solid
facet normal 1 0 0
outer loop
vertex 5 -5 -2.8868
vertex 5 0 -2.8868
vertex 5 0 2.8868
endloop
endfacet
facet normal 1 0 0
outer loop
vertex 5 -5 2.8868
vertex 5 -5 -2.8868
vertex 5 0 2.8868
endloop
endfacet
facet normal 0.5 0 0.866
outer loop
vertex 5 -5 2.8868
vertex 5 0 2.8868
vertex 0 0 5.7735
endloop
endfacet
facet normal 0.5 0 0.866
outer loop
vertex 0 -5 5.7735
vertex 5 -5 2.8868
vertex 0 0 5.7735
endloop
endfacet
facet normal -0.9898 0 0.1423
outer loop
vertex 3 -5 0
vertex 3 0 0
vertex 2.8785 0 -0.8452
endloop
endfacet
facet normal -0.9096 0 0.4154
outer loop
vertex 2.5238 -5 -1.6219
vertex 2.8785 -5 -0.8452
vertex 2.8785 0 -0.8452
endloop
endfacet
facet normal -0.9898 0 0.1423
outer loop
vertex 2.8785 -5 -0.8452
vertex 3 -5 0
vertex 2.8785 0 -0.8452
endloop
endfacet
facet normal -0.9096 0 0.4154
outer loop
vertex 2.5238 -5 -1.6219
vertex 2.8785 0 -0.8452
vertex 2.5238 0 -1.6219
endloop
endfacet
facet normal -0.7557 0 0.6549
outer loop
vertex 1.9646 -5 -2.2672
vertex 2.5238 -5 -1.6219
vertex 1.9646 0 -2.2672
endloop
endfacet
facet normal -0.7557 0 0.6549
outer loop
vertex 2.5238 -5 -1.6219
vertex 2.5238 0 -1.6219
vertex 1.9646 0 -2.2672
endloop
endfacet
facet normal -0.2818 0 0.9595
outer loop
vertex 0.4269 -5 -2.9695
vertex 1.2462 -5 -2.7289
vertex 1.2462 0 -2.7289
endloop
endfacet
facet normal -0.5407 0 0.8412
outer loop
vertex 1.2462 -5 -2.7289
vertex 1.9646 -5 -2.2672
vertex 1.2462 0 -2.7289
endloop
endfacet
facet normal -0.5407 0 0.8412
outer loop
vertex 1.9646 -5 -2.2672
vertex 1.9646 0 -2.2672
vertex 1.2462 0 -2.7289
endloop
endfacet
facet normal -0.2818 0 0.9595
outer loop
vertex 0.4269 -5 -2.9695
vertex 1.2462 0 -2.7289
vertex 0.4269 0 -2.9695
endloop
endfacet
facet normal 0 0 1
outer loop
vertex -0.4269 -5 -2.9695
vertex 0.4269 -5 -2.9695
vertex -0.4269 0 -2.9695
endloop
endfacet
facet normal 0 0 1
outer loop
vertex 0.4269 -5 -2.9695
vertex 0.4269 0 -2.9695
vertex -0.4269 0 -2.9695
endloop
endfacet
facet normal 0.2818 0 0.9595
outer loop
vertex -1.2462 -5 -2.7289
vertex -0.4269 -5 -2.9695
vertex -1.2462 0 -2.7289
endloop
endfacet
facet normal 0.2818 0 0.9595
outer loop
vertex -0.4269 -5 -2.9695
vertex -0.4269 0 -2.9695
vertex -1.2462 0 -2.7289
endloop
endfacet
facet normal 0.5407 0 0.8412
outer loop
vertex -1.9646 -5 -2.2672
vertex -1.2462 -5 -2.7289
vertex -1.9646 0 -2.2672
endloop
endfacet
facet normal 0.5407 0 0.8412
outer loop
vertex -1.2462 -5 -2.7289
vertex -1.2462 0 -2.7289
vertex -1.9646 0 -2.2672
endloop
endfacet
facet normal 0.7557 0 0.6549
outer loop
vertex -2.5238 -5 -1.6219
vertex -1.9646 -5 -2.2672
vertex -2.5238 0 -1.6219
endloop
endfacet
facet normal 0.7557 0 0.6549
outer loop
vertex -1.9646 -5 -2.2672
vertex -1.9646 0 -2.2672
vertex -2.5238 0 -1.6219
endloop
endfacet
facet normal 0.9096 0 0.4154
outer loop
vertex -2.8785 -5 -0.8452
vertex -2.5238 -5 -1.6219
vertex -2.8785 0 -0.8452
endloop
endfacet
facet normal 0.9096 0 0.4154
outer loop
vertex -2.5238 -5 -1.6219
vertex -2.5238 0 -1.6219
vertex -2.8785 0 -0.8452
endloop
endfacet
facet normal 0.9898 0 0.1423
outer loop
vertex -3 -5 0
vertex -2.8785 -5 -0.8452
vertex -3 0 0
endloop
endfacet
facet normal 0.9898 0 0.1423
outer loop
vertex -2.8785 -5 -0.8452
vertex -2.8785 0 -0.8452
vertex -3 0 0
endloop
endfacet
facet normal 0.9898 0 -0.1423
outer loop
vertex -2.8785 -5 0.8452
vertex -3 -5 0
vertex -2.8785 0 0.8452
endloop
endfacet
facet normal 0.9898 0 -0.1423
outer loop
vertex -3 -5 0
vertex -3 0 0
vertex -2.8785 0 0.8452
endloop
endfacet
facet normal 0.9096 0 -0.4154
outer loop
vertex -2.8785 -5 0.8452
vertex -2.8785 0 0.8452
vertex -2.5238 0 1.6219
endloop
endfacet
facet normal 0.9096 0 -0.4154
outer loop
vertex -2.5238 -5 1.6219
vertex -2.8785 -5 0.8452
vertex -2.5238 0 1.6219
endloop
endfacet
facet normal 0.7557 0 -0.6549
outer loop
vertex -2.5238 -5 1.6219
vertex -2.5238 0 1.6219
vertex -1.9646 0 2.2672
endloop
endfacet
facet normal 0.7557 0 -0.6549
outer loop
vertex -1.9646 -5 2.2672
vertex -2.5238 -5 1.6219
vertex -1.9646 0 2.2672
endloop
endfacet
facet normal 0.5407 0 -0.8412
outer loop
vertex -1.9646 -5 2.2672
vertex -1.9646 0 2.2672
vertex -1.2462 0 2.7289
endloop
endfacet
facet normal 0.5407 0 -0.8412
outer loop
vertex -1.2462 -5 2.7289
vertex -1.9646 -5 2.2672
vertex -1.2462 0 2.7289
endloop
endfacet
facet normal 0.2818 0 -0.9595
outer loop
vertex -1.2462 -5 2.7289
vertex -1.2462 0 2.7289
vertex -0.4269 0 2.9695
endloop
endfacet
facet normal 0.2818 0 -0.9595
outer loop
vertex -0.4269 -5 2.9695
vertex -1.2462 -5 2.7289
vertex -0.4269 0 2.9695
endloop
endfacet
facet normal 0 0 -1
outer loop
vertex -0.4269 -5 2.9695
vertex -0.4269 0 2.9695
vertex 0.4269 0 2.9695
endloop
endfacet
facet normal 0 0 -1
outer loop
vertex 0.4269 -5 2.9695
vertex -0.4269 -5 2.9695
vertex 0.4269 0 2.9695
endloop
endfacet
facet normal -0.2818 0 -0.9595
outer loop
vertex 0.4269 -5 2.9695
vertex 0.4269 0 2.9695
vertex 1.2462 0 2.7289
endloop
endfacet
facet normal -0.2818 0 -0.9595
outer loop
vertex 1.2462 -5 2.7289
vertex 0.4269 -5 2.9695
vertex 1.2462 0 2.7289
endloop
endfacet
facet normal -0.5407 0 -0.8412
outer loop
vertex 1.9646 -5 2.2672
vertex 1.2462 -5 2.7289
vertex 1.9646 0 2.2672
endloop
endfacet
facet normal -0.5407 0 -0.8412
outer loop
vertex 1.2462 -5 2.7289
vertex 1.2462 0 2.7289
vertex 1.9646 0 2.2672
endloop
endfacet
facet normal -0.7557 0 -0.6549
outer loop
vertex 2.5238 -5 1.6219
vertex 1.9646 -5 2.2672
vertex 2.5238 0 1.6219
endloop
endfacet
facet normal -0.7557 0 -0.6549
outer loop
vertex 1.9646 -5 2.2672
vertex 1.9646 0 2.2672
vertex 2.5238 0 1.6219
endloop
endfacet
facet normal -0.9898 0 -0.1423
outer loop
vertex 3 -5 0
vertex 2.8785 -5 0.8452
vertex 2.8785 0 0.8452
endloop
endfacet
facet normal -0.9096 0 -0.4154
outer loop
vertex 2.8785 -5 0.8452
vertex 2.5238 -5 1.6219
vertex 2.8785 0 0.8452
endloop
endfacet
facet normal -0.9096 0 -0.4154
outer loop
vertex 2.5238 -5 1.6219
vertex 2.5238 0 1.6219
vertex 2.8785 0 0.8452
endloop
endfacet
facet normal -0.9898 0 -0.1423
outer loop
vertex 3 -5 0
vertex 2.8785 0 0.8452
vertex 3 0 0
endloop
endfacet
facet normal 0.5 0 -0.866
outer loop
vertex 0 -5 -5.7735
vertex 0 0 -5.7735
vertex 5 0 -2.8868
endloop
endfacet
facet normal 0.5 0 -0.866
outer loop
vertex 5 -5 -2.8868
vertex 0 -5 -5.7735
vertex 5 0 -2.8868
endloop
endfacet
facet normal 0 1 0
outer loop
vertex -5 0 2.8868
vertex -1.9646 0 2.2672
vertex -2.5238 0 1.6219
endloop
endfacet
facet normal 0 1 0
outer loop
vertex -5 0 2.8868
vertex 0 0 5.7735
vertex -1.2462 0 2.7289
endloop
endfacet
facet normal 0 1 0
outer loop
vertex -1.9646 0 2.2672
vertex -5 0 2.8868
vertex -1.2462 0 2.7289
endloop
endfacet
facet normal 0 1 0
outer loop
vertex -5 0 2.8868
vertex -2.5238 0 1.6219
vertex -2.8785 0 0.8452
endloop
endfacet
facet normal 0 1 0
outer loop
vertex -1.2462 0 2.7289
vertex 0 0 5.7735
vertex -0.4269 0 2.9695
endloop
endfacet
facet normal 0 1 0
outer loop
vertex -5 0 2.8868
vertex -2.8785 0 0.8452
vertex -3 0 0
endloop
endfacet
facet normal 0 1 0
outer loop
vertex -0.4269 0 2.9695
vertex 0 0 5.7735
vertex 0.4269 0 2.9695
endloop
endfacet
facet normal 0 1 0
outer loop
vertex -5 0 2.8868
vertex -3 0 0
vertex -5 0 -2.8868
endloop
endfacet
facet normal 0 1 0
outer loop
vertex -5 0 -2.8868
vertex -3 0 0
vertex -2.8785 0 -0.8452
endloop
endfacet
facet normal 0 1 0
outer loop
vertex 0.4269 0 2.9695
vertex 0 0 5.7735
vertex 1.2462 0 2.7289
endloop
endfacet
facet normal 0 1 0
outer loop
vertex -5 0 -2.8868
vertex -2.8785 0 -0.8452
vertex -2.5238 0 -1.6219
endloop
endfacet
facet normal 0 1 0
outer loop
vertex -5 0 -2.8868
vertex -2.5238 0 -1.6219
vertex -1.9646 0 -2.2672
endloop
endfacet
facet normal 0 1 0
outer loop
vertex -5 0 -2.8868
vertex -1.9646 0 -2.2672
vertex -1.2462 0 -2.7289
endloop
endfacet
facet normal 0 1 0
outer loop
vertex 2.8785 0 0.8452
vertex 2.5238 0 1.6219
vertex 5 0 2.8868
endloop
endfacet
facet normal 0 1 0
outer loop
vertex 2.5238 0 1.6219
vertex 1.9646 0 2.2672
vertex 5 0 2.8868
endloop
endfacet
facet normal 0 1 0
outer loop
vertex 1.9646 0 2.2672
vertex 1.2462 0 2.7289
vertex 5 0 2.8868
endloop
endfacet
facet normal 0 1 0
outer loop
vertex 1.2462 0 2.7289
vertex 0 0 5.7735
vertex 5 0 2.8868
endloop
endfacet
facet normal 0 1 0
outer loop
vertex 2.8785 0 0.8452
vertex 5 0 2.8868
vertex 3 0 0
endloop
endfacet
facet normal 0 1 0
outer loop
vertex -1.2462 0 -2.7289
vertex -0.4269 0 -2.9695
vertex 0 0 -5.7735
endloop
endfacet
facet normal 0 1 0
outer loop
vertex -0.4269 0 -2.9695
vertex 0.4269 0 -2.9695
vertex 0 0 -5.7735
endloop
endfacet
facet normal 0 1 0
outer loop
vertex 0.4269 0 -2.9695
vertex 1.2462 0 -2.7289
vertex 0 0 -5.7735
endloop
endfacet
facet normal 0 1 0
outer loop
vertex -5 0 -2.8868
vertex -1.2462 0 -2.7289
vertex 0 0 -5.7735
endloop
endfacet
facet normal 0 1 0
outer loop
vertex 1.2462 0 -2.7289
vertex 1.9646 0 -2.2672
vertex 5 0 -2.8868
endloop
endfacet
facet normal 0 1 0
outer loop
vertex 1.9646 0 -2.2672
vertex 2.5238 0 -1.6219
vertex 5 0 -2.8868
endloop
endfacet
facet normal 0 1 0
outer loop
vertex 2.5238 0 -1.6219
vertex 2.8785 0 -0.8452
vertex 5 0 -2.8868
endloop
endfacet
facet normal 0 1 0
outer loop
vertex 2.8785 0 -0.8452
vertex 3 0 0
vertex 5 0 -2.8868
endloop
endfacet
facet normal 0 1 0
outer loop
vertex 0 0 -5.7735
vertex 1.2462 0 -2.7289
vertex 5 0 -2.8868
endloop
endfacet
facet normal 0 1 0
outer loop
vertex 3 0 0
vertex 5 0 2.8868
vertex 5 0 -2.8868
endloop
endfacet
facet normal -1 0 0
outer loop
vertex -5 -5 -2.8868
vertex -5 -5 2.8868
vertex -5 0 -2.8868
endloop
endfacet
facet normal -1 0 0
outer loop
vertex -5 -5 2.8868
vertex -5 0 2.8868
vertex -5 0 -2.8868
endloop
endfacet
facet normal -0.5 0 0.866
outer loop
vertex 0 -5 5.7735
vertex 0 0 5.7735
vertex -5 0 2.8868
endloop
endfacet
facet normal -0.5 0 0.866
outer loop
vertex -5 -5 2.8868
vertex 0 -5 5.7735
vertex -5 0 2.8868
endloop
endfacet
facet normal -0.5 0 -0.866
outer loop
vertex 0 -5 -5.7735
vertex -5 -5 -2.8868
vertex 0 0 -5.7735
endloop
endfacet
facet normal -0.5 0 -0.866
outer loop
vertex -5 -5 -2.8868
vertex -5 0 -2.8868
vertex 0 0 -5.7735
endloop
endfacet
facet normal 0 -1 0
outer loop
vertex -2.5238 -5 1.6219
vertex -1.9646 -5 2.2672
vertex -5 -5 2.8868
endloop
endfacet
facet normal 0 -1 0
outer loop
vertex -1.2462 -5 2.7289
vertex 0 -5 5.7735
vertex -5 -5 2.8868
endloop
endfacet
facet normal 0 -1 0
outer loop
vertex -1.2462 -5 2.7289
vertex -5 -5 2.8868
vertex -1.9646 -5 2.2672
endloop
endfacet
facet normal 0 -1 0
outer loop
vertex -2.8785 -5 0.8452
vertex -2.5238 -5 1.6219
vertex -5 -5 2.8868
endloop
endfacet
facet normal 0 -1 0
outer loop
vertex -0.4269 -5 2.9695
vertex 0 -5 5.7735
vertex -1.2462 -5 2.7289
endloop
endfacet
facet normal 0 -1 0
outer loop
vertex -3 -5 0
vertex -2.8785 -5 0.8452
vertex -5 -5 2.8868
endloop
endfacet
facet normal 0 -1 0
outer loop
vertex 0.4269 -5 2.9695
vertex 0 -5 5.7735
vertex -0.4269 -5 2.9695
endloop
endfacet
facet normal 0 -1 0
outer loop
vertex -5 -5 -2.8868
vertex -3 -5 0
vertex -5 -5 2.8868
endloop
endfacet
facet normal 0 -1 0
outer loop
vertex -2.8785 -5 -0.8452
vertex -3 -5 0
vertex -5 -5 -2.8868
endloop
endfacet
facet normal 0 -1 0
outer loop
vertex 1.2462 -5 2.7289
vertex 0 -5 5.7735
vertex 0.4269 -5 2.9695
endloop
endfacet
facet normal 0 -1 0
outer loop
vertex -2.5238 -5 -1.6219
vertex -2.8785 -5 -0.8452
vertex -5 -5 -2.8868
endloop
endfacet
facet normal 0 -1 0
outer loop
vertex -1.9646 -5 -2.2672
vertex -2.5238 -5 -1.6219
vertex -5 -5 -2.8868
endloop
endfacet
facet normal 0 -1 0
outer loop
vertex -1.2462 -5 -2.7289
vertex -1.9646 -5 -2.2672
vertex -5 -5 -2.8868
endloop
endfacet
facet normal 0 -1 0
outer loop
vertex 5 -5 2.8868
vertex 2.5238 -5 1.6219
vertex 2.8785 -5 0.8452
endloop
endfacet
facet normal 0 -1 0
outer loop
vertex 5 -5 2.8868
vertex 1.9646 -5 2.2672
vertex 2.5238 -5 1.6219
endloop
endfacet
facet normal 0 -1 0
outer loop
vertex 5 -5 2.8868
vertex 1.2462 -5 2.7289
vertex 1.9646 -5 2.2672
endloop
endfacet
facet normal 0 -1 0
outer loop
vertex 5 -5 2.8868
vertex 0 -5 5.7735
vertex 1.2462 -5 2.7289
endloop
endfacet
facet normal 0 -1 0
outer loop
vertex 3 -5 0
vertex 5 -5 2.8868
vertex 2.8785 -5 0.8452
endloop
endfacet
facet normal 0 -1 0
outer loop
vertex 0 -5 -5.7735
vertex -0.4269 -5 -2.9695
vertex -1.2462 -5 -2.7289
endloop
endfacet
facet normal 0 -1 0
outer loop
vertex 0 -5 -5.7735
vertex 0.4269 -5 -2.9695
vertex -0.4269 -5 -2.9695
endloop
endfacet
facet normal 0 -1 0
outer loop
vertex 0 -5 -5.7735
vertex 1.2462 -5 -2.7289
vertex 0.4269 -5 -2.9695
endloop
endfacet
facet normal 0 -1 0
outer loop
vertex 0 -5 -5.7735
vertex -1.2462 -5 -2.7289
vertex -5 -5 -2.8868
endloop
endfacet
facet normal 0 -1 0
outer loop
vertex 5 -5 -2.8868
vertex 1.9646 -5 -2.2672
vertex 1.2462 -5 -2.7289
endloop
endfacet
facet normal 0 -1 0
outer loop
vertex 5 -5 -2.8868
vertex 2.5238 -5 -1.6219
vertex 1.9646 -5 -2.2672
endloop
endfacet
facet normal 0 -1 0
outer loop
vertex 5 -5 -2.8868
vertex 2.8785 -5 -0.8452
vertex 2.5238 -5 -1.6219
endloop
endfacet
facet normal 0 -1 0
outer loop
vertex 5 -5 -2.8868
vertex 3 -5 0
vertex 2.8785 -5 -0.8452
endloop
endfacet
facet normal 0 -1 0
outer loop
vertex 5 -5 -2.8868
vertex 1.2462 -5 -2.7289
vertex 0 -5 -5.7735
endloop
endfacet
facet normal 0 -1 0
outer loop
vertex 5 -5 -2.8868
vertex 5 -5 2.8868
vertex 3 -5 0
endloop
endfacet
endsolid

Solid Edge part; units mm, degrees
sketch "Sketch1" plane through (0, 0, 0) normal (0, -1, 0) x (1, 0, 0)
  circle A0 centre (0, 0) radius 3
  line L0 (5, 2.8868) -> (0, 5.7735)
  line L1 (0, 5.7735) -> (-5, 2.8868)
  line L2 (-5, 2.8868) -> (-5, -2.8868)
  line L3 (-5, -2.8868) -> (0, -5.7735)
  line L4 (0, -5.7735) -> (5, -2.8868)
  line L5 (5, -2.8868) -> (5, 2.8868)
  dimension "D1" = 10
  dimension "D2" = 6
extrude "Protrusion1" add sketch "Sketch1" along normal blind 5
cosmetic_thread "Thread1" size "M6"
properties material "NYLON"
